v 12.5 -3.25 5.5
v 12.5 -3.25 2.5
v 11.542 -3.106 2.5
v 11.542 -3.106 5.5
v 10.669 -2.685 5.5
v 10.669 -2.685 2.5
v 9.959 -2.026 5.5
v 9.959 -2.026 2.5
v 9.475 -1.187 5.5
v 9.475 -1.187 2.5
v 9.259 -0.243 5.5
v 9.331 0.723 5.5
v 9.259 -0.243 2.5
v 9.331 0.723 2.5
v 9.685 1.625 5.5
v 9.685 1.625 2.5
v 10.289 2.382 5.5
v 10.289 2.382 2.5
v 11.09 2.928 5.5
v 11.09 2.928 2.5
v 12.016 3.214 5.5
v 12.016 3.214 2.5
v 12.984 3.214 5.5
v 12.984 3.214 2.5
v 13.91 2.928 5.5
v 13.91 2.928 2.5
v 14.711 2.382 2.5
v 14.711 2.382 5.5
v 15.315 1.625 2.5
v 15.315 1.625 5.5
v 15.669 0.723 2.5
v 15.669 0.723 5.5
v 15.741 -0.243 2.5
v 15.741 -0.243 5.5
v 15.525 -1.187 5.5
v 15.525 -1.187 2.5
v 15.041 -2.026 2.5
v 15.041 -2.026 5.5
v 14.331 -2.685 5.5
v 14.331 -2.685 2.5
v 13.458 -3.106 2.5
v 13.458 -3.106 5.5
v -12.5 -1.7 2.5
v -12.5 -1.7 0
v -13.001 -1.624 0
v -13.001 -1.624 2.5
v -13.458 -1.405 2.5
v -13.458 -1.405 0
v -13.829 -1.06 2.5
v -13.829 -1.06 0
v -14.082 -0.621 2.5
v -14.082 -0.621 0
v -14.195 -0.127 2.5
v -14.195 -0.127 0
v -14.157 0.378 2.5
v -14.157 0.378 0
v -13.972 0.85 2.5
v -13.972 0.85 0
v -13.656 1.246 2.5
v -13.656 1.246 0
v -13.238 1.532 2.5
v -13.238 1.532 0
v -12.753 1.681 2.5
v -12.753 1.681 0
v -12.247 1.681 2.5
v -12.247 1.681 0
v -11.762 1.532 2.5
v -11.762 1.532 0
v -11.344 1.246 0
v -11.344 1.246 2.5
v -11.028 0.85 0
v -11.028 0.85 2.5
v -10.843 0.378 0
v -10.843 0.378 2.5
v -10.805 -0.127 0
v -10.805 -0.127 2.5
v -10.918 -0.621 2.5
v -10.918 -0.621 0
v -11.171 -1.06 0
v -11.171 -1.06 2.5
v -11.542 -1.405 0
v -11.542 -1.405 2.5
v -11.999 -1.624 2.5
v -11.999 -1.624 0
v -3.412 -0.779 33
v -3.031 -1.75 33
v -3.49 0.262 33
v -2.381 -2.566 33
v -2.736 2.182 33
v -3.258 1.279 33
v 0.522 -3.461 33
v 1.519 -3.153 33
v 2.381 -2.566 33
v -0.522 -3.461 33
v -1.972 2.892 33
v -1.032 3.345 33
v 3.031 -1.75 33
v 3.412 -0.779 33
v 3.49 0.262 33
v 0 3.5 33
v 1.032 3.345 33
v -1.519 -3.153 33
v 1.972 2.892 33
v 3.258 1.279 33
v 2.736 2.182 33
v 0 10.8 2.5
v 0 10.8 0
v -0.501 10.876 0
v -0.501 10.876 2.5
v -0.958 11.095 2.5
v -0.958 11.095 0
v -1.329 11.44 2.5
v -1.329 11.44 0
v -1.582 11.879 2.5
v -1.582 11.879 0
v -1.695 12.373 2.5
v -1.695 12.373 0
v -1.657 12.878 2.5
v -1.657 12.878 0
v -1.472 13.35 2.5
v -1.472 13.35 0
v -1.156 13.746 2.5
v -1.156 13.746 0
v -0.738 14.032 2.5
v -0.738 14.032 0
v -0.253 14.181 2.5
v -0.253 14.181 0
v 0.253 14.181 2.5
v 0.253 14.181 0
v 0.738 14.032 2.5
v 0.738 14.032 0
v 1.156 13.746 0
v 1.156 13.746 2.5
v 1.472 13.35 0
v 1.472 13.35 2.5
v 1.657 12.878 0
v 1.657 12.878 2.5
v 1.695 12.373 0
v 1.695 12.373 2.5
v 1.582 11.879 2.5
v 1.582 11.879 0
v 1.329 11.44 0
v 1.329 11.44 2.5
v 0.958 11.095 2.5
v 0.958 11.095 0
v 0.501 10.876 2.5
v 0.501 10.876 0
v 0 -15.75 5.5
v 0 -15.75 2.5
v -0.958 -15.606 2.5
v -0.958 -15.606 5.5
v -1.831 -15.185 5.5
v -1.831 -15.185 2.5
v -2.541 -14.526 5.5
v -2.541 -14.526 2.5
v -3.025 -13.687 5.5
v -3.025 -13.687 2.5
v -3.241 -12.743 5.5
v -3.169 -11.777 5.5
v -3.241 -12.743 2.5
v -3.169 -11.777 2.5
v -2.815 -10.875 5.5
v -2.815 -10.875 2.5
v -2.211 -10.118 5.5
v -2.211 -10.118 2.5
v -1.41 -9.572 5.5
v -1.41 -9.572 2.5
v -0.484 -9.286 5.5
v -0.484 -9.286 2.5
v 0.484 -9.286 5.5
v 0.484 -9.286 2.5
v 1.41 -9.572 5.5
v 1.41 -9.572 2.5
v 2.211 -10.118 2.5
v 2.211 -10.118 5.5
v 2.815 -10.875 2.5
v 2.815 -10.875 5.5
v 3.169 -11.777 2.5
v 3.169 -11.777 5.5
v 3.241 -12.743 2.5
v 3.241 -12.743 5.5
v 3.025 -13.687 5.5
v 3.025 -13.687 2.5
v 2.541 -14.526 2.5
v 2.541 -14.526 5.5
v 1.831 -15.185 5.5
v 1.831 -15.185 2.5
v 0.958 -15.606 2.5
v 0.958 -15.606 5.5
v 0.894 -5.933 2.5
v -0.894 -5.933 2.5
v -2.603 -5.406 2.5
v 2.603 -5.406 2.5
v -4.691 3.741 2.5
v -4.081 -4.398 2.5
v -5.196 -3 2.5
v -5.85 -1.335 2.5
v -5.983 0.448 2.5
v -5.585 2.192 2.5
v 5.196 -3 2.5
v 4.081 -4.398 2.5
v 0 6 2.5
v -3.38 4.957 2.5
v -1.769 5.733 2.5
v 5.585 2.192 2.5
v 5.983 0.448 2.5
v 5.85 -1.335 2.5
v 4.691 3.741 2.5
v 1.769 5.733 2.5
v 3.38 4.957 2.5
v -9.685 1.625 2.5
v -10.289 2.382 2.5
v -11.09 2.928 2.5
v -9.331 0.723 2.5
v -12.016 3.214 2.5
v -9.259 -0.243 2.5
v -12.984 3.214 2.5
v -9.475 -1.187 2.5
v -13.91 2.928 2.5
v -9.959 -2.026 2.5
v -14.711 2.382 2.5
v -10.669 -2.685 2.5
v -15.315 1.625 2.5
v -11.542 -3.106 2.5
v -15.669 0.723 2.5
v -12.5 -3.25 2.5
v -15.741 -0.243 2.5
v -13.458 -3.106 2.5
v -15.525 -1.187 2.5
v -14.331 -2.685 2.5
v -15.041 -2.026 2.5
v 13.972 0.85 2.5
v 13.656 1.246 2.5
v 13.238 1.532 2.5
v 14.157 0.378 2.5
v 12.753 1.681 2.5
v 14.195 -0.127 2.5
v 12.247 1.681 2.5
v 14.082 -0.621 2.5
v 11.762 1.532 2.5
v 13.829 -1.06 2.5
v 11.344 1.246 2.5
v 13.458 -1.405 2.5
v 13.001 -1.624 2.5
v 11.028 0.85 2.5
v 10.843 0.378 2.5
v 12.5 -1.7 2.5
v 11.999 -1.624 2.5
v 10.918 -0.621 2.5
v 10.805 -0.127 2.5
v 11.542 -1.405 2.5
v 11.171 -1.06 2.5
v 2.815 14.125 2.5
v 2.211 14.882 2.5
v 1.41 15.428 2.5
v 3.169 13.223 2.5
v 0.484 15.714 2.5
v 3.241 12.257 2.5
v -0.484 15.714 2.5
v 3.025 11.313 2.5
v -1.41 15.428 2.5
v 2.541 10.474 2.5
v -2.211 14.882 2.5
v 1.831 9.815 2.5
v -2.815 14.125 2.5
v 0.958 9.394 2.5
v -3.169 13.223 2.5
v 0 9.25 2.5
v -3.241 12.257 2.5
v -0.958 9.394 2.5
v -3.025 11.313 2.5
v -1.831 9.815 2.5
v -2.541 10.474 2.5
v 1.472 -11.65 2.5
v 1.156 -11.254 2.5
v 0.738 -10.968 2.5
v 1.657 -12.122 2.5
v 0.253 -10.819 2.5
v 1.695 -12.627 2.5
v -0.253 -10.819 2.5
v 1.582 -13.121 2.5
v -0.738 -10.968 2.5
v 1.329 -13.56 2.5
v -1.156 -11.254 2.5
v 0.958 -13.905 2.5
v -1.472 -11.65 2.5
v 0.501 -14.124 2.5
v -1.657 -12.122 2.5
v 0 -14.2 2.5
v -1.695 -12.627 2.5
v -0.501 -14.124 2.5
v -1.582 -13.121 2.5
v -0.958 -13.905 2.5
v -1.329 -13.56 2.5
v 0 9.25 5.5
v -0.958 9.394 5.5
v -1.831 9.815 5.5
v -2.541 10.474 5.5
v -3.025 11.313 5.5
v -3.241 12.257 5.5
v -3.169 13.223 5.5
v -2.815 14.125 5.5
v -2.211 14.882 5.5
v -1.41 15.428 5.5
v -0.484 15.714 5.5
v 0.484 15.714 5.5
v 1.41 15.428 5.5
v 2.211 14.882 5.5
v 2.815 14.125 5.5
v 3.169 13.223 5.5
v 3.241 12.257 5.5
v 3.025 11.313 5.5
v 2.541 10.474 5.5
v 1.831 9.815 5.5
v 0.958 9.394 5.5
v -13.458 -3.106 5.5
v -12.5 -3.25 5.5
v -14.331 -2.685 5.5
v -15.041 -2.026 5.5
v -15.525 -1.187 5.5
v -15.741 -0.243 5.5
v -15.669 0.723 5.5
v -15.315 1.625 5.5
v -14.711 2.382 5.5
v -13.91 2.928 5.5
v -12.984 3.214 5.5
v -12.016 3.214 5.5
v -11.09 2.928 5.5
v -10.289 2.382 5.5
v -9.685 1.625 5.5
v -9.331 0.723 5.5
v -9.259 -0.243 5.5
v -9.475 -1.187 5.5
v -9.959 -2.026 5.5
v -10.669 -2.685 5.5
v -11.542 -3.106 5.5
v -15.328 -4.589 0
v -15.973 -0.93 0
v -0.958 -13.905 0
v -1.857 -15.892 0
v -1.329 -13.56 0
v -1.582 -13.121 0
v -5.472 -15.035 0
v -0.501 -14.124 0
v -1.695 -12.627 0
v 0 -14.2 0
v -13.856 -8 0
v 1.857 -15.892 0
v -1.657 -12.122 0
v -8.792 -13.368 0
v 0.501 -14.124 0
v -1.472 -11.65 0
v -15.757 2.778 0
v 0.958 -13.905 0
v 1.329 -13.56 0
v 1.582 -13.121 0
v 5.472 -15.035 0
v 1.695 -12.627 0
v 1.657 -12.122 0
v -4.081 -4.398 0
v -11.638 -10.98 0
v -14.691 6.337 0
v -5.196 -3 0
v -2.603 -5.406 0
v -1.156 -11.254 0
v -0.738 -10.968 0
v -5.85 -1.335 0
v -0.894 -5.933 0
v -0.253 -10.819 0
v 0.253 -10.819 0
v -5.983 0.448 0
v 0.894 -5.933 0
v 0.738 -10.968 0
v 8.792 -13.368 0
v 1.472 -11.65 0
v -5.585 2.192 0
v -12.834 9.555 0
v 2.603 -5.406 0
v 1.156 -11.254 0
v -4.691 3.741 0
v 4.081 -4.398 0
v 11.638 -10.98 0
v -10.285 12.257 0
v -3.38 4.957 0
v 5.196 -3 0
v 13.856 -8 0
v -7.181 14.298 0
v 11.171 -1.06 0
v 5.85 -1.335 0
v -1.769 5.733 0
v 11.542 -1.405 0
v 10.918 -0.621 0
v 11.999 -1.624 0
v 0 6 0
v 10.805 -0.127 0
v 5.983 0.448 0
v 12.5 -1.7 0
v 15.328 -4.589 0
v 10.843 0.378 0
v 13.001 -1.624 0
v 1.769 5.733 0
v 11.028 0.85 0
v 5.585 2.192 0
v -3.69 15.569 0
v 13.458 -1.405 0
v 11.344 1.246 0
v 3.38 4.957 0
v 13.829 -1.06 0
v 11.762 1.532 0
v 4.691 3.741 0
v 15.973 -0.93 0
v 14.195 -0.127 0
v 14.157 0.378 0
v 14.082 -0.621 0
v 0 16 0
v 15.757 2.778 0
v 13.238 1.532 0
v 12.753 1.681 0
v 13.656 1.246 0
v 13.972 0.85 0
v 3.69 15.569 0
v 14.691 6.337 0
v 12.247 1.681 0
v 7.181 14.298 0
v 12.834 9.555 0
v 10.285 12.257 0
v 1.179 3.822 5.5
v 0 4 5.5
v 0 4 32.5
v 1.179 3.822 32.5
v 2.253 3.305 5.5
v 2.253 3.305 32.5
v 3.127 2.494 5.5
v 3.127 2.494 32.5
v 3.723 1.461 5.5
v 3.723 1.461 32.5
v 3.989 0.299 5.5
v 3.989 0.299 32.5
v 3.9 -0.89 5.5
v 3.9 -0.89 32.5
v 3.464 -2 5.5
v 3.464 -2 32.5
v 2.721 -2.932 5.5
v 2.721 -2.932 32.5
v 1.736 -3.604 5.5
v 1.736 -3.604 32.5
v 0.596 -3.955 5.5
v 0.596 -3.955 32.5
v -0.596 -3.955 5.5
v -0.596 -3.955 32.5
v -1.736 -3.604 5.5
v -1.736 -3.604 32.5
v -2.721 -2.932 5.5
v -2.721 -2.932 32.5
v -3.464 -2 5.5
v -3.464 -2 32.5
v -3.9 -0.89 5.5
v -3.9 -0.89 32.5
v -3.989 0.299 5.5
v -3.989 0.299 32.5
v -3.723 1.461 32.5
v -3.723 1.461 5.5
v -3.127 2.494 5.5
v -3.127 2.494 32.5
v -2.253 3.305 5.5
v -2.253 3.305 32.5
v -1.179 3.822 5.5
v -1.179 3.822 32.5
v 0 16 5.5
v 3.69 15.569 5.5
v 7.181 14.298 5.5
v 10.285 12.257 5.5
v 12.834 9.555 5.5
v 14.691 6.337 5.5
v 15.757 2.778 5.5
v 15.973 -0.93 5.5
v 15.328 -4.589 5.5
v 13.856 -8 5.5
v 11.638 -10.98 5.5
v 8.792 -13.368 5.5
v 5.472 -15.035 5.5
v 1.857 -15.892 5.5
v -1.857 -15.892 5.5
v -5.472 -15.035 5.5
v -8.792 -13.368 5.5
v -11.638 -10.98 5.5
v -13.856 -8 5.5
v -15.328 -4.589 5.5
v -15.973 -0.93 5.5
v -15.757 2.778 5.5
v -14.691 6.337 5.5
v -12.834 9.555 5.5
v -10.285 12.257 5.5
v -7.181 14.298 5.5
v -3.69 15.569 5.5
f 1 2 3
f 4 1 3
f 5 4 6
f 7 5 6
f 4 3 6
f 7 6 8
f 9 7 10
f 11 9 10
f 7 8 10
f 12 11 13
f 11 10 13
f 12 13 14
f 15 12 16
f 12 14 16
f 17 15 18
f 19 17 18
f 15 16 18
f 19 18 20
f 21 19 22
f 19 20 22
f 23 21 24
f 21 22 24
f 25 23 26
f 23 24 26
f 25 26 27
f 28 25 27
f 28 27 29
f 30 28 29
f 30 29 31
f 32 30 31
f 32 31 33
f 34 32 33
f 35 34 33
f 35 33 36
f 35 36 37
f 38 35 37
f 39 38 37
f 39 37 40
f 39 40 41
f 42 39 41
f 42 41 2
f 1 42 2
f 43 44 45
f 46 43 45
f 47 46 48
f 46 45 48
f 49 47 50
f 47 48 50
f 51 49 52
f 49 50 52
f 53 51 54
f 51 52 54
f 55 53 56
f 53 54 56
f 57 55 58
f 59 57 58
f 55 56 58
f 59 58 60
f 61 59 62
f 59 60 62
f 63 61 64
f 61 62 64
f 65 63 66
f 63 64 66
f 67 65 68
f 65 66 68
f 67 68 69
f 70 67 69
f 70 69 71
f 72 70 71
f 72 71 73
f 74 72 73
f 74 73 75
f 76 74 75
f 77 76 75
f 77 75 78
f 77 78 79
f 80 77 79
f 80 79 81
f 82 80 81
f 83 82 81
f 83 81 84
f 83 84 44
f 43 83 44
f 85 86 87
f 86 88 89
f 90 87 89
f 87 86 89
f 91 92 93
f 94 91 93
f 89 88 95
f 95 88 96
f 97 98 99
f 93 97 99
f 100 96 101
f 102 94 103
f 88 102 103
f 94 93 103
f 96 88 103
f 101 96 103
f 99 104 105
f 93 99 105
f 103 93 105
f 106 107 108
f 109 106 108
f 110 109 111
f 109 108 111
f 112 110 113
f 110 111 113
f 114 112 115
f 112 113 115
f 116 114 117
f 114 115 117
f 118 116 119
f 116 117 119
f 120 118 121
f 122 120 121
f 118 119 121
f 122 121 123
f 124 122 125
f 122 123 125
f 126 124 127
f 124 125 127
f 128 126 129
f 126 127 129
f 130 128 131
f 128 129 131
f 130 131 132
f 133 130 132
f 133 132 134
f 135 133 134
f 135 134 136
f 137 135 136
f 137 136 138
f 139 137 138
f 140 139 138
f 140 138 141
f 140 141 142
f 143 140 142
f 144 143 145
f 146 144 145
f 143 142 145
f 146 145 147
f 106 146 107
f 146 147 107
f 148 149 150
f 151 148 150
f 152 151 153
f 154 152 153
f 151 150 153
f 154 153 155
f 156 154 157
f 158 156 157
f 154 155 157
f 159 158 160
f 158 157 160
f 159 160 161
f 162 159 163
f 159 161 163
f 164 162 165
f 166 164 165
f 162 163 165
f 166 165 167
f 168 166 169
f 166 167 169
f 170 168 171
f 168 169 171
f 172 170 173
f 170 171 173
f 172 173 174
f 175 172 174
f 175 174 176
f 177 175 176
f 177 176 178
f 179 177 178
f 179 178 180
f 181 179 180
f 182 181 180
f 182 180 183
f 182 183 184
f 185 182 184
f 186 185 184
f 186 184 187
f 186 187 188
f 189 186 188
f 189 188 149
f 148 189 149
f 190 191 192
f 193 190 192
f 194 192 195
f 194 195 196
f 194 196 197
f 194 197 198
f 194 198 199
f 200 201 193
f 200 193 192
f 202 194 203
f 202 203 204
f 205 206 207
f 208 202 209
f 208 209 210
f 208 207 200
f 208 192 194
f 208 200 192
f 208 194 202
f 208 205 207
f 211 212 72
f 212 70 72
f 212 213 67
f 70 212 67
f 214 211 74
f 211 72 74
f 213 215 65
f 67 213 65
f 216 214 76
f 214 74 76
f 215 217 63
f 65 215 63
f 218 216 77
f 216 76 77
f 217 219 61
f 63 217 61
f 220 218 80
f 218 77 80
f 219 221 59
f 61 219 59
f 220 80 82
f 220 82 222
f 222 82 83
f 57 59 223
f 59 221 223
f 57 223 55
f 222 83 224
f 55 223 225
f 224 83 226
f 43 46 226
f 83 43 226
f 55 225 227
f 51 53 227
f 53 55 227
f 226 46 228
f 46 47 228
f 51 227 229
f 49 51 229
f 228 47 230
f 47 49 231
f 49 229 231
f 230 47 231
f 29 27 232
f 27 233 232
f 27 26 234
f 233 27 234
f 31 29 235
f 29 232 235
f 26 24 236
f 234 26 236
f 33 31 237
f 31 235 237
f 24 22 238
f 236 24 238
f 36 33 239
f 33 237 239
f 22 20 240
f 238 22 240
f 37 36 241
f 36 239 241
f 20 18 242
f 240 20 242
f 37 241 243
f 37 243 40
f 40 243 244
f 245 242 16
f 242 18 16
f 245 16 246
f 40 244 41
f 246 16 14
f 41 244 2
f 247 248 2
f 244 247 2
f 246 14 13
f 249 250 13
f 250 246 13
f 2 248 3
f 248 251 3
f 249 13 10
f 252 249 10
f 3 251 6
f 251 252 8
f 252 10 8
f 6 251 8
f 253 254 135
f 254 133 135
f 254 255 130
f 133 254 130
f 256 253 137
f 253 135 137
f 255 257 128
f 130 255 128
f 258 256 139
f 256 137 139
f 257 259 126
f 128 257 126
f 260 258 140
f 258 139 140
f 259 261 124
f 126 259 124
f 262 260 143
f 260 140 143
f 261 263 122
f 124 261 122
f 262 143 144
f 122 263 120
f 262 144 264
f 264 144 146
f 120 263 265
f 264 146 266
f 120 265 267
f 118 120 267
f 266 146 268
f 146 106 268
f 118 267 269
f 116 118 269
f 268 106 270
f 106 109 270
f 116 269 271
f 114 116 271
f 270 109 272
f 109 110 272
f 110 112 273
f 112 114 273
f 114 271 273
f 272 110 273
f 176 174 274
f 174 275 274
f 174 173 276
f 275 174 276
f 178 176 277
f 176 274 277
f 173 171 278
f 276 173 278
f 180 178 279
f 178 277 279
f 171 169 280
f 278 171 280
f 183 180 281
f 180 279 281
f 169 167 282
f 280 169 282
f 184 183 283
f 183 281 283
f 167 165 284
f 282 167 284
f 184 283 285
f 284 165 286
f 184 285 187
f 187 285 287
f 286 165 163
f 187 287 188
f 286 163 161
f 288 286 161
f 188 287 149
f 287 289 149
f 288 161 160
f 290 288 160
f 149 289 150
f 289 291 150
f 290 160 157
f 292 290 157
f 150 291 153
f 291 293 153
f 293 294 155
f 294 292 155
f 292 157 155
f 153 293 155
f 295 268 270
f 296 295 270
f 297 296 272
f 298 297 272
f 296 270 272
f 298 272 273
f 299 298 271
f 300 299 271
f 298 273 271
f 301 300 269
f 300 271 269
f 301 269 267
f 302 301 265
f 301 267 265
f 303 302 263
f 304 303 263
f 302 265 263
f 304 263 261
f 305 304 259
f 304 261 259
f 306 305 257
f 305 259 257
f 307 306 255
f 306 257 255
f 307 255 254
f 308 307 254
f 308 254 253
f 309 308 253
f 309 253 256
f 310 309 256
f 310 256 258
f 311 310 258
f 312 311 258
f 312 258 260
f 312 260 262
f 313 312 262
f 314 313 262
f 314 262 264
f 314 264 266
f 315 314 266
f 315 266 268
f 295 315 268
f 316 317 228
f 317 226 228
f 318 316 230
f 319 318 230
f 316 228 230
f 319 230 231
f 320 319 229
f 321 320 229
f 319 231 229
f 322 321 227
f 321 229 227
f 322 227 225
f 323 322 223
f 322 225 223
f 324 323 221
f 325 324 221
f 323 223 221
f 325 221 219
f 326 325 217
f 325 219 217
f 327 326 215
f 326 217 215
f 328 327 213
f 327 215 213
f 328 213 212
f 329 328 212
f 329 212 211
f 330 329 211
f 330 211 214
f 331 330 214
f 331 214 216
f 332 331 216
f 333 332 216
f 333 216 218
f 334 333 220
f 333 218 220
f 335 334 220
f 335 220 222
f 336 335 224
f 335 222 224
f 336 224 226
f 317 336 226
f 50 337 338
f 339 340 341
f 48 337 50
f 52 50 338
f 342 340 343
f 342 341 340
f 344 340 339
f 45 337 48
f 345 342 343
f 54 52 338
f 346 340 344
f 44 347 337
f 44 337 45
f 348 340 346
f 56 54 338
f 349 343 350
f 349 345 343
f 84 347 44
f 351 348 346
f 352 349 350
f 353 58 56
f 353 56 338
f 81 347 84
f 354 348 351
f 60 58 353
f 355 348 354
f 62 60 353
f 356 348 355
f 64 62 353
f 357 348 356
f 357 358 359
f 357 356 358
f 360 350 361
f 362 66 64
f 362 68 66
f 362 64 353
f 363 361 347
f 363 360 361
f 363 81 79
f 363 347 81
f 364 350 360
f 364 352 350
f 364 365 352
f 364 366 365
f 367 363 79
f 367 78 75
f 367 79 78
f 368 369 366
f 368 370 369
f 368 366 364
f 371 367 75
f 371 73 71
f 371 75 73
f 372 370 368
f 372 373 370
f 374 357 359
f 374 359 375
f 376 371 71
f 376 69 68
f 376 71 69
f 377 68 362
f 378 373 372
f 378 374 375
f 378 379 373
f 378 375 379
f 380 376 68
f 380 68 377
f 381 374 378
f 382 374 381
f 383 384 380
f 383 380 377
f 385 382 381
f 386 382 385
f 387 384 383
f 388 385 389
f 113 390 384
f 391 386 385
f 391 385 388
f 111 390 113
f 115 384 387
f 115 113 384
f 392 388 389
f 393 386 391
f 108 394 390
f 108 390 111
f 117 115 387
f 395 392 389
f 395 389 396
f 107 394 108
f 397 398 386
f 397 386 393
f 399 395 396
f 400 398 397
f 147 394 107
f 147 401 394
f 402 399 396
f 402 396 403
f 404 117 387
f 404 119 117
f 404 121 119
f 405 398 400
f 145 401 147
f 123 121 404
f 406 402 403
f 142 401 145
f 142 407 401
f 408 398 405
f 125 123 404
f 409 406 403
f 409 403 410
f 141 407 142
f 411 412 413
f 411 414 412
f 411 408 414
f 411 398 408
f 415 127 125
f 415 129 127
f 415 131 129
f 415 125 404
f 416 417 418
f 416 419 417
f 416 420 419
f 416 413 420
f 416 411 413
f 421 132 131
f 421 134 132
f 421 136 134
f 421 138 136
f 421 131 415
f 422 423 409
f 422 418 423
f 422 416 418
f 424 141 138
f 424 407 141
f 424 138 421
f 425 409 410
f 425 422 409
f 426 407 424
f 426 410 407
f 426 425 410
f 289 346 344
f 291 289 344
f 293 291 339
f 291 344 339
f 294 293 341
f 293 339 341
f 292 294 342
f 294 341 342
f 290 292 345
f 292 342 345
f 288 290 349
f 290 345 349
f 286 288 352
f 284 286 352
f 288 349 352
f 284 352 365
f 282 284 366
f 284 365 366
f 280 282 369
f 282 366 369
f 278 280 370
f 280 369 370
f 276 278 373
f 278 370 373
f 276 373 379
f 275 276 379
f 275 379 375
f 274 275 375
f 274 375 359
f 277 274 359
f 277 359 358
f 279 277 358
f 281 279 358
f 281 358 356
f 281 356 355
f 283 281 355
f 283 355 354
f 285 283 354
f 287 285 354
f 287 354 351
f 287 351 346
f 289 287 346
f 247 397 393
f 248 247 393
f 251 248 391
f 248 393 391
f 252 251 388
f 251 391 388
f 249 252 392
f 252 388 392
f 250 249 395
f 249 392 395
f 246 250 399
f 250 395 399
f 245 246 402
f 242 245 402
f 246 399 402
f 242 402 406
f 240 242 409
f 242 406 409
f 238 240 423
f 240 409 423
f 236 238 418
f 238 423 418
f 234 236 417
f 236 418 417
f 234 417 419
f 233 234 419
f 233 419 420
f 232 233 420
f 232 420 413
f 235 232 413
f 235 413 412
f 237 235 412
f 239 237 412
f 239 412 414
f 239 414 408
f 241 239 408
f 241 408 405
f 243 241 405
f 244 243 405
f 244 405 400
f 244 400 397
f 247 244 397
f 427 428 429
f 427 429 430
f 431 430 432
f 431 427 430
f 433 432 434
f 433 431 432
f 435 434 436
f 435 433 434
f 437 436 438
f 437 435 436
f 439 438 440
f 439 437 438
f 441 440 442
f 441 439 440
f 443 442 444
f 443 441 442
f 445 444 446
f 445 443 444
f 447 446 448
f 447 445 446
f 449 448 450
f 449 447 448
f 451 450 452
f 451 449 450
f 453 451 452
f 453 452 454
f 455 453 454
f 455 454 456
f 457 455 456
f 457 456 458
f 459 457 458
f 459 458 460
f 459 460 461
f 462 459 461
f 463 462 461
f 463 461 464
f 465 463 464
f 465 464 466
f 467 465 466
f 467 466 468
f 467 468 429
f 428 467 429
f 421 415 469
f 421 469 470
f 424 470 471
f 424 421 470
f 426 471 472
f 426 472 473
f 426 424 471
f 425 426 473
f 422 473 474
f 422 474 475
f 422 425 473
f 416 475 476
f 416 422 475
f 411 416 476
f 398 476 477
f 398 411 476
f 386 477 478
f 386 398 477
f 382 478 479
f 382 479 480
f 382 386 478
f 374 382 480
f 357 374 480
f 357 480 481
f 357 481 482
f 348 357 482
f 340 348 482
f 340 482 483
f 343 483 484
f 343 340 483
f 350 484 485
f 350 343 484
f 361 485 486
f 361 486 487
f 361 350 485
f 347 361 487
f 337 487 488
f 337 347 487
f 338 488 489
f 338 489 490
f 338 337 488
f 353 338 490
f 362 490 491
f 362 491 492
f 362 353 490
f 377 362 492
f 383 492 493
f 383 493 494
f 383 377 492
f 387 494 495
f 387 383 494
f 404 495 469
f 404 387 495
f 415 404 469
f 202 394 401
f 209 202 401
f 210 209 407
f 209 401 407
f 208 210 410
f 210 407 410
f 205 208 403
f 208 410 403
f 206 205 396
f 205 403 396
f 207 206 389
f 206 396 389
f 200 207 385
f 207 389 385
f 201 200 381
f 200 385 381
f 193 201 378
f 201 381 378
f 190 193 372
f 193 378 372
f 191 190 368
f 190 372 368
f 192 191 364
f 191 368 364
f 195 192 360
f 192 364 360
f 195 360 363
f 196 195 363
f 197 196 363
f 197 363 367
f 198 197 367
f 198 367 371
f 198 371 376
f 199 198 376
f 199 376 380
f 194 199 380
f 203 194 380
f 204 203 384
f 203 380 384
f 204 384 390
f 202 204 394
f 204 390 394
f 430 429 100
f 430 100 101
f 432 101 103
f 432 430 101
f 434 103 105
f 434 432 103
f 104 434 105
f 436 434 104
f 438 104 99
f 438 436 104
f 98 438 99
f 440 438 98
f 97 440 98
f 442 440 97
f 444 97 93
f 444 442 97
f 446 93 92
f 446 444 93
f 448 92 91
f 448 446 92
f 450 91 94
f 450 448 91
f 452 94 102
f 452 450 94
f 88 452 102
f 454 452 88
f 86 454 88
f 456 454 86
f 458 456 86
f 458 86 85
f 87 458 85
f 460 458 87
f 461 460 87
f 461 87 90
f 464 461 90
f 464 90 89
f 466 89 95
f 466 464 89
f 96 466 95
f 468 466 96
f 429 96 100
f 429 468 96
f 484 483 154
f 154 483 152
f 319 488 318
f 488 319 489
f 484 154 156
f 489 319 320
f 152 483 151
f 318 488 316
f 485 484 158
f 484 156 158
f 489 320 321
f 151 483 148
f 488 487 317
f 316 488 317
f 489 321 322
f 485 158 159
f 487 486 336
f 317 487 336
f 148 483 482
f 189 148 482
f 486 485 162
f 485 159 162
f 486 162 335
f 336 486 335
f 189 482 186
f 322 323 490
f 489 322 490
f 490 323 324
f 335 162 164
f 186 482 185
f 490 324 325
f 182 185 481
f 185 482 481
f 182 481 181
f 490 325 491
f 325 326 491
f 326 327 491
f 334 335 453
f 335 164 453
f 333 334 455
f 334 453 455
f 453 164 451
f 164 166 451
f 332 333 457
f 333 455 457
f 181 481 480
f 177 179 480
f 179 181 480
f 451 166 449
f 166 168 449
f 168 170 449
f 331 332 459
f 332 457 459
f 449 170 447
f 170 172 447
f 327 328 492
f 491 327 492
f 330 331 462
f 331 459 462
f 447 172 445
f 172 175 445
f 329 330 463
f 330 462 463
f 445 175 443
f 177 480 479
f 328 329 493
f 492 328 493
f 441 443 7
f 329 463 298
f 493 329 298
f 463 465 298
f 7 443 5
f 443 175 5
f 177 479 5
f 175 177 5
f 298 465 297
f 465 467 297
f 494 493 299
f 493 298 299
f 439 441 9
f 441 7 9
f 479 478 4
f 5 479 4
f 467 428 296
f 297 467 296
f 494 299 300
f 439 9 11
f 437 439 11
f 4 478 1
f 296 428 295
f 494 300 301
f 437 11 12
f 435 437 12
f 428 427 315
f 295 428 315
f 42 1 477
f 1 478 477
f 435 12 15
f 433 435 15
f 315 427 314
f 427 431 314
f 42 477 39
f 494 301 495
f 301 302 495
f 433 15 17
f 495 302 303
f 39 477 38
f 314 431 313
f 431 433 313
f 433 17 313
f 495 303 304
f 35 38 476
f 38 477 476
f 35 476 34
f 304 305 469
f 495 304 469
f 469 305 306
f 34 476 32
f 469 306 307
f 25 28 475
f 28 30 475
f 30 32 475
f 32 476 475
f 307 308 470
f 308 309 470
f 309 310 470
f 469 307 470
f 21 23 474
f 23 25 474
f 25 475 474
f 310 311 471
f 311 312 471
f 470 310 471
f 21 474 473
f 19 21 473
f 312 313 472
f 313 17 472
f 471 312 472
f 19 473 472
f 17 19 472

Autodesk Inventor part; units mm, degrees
ref_plane "YZ Plane" through (0, 0, 0) normal (1, 0, 0) x (0, 1, 0)
ref_plane "XZ Plane" through (0, 0, 0) normal (0, 1, 0) x (-1, 0, 0)
ref_plane "XY Plane" through (0, 0, 0) normal (0, 0, 1) x (1, 0, 0)
sketch "スケッチ1" plane through (0, 0, 0) normal (1, 0, 0) x (0, 1, 0)
  line L0 (0, 33) -> (4, 33)
  line L1 (4, 33) -> (4, 5.5)
  line L2 (4, 5.5) -> (16, 5.5)
  line L3 (16, 5.5) -> (16, 0)
  line L4 (0, 33) -> (0, 2.5)
  line L5 (0, 2.5) -> (6, 2.5)
  line L6 (6, 2.5) -> (6, 0)
  line L7 (6, 0) -> (16, 0)
  point P0 (0, 0)
  dimension "d0" = 4
  dimension "d2" = 5.5
  dimension "d3" = 27.5
  dimension "d22" = 2.5
  dimension "d23" = 6
  dimension "d24" = 16
revolve "回転1" add sketch "スケッチ1" angle 360 about axis through (0, 0, 33) along (0, 0, -1)
sketch "スケッチ2" plane through (0, 0, 5.5) normal (0, 0, 1) x (1, 0, 0)
  circle A0 centre (0, 0) radius 12.5
  point P0 (0, 0)
  point P1 (0, 12.5)
  point P2 (-12.5, 0)
  point P3 (0, -12.5)
  point P4 (12.5, 0)
  dimension "d5" = 25
  dimension "d8" = 360
hole "穴1" at (0, 12.5, 5.5) at (-12.5, 0, 5.5) at (0, -12.5, 5.5) at (12.5, 0, 5.5) direction (0, 0, -1) diameter 3.4 end through all counterbore diameter 6.5 counterbore depth 3 clearance for "Socket Head Cap Screw" size "M3" standard "Ansi Metric M Profile"
thread "ねじ1" size "M8x1.25" class "6g" standard "ANSI Metric M Profile" length 17 offset 10.5
chamfer "面取り1" distance 0.5 angle 45 1 edges at (0, -4, 33)
properties part number "adapter1" material "アルミニウム 6061"
